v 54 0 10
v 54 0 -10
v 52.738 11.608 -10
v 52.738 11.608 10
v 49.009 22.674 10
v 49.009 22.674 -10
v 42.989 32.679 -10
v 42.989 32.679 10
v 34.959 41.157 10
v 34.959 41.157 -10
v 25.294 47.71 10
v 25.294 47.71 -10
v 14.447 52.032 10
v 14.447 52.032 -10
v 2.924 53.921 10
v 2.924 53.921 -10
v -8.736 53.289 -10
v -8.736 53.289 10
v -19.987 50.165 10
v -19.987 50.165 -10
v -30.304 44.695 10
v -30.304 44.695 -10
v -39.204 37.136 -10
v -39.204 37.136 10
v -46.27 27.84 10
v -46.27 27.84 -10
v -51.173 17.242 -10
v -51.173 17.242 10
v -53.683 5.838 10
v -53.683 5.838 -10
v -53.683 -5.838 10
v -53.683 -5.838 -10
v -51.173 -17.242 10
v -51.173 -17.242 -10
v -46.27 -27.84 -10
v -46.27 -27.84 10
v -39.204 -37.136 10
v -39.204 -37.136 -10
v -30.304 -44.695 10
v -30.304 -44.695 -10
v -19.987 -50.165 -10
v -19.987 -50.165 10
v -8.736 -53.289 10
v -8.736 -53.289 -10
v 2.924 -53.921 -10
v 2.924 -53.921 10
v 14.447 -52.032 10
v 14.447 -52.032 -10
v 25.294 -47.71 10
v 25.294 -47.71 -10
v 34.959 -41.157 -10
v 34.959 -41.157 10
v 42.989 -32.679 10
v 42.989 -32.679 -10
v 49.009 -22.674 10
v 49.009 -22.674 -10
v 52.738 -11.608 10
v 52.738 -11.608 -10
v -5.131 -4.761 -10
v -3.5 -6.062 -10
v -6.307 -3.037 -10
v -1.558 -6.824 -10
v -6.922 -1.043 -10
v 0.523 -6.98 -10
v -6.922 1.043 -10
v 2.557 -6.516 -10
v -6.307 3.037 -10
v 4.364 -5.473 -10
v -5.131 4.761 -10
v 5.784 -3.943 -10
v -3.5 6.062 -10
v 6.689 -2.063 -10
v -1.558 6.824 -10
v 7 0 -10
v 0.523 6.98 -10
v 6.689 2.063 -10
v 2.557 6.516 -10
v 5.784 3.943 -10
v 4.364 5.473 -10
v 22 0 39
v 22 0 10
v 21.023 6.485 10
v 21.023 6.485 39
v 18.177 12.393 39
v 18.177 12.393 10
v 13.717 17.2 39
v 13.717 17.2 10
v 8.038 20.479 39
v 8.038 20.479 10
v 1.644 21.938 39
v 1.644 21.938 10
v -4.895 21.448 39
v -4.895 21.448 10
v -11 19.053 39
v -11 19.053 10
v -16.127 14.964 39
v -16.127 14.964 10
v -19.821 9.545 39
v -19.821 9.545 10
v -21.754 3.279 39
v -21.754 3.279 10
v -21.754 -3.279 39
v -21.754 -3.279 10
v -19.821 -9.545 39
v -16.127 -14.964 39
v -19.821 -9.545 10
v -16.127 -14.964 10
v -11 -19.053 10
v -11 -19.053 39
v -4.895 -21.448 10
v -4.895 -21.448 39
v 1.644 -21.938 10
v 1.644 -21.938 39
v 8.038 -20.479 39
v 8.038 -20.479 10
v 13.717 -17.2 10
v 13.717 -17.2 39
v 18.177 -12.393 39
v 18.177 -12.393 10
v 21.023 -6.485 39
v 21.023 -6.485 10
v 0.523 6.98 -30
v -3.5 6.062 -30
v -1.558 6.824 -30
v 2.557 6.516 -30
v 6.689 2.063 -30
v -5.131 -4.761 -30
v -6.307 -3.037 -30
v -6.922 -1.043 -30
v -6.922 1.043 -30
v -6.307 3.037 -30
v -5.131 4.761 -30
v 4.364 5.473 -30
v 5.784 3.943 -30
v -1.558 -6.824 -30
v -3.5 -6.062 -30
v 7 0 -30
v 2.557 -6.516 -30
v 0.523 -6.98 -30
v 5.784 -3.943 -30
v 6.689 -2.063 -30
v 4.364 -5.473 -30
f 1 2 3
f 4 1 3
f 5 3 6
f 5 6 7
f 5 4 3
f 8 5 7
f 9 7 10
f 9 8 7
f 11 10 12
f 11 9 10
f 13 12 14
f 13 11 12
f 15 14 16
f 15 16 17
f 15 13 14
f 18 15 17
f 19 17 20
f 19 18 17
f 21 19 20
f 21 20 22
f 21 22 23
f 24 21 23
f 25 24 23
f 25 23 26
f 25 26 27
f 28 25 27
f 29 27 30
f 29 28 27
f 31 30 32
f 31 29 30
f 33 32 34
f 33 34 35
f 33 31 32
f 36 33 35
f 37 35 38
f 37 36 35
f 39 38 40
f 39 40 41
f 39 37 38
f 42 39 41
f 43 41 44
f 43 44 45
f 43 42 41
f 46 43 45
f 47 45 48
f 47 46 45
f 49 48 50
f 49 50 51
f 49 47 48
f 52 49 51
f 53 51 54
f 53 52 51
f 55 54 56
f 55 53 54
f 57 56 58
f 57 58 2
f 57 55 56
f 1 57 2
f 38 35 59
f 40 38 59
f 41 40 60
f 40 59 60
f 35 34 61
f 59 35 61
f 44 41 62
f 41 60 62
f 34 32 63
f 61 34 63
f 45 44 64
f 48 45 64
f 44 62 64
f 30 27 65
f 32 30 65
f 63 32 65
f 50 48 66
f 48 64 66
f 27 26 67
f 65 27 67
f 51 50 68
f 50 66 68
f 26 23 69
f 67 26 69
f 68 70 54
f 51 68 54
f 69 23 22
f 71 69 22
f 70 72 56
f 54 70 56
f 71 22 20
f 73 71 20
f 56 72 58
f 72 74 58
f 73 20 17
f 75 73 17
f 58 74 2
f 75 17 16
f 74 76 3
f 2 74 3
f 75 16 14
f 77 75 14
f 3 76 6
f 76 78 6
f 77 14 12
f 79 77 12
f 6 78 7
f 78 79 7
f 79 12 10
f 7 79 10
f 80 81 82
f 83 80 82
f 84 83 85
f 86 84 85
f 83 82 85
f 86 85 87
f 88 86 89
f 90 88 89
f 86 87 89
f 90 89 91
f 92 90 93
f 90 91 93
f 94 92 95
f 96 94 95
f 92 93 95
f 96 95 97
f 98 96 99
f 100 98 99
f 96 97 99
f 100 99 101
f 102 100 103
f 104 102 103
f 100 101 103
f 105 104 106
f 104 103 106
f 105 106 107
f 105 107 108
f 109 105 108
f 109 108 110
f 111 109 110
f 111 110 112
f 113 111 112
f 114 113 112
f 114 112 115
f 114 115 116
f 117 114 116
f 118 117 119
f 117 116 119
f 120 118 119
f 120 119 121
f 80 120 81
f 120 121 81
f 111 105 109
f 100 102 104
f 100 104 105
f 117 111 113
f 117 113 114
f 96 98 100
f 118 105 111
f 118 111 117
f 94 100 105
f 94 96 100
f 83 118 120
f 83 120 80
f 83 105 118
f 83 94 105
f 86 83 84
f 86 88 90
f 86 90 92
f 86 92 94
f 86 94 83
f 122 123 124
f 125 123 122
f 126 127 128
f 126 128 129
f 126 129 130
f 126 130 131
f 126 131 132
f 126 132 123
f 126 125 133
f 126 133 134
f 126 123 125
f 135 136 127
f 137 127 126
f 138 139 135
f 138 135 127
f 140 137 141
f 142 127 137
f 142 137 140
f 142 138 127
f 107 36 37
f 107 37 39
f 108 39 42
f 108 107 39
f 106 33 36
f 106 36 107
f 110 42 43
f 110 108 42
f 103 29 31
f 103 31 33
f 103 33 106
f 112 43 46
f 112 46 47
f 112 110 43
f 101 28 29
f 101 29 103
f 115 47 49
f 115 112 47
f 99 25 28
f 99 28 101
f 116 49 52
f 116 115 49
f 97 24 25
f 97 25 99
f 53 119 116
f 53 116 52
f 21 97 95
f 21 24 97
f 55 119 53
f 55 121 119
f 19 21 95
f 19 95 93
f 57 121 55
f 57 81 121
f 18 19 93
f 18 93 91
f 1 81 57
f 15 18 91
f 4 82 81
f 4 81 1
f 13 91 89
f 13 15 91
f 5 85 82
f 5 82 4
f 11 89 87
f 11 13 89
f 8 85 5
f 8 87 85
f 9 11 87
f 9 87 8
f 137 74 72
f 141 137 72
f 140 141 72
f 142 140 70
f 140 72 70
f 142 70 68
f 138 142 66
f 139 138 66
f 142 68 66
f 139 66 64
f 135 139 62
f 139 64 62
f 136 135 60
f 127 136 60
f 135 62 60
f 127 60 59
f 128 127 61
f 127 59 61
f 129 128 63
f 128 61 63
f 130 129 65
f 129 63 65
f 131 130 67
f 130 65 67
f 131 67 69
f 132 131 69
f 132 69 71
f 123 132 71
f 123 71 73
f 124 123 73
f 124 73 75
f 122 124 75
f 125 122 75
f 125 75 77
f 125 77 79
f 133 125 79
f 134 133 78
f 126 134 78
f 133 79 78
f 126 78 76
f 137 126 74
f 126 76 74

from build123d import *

# Parameters (mm, degrees)
SKETCH006_R      = 54
EXTRUDE006_DEPTH = 20
SKETCH007_R      = 22
EXTRUDE007_DEPTH = 29
SKETCH008_R      = 7
EXTRUDE008_DEPTH = 20


with BuildPart() as gearholder:
    # Sketch006 (on Face123 of Fusion001) → Extrude006 (new body)
    with BuildSketch(Plane.XY.offset(10)):
        Circle(SKETCH006_R)
    extrude(amount=-EXTRUDE006_DEPTH)


with BuildPart() as motorshaftholder:
    # Sketch007 (on Face3 of Extrude006) → Extrude007 (new body)
    with BuildSketch(Plane.XY.offset(10)):
        Circle(SKETCH007_R)
    extrude(amount=EXTRUDE007_DEPTH)


with BuildPart() as holdercombo:
    # Sketch008 (on Face2 of Extrude006) → Extrude008 (new body)
    with BuildSketch(Plane(origin=(0, 0, -10), x_dir=(1, 0, 0), z_dir=(0, 0, -1))):
        Circle(SKETCH008_R)
    extrude(amount=EXTRUDE008_DEPTH)

    # Fusion006: union gearHolder, motorShaftHolder
    add(gearholder.part)
    add(motorshaftholder.part)


solid = holdercombo.part
